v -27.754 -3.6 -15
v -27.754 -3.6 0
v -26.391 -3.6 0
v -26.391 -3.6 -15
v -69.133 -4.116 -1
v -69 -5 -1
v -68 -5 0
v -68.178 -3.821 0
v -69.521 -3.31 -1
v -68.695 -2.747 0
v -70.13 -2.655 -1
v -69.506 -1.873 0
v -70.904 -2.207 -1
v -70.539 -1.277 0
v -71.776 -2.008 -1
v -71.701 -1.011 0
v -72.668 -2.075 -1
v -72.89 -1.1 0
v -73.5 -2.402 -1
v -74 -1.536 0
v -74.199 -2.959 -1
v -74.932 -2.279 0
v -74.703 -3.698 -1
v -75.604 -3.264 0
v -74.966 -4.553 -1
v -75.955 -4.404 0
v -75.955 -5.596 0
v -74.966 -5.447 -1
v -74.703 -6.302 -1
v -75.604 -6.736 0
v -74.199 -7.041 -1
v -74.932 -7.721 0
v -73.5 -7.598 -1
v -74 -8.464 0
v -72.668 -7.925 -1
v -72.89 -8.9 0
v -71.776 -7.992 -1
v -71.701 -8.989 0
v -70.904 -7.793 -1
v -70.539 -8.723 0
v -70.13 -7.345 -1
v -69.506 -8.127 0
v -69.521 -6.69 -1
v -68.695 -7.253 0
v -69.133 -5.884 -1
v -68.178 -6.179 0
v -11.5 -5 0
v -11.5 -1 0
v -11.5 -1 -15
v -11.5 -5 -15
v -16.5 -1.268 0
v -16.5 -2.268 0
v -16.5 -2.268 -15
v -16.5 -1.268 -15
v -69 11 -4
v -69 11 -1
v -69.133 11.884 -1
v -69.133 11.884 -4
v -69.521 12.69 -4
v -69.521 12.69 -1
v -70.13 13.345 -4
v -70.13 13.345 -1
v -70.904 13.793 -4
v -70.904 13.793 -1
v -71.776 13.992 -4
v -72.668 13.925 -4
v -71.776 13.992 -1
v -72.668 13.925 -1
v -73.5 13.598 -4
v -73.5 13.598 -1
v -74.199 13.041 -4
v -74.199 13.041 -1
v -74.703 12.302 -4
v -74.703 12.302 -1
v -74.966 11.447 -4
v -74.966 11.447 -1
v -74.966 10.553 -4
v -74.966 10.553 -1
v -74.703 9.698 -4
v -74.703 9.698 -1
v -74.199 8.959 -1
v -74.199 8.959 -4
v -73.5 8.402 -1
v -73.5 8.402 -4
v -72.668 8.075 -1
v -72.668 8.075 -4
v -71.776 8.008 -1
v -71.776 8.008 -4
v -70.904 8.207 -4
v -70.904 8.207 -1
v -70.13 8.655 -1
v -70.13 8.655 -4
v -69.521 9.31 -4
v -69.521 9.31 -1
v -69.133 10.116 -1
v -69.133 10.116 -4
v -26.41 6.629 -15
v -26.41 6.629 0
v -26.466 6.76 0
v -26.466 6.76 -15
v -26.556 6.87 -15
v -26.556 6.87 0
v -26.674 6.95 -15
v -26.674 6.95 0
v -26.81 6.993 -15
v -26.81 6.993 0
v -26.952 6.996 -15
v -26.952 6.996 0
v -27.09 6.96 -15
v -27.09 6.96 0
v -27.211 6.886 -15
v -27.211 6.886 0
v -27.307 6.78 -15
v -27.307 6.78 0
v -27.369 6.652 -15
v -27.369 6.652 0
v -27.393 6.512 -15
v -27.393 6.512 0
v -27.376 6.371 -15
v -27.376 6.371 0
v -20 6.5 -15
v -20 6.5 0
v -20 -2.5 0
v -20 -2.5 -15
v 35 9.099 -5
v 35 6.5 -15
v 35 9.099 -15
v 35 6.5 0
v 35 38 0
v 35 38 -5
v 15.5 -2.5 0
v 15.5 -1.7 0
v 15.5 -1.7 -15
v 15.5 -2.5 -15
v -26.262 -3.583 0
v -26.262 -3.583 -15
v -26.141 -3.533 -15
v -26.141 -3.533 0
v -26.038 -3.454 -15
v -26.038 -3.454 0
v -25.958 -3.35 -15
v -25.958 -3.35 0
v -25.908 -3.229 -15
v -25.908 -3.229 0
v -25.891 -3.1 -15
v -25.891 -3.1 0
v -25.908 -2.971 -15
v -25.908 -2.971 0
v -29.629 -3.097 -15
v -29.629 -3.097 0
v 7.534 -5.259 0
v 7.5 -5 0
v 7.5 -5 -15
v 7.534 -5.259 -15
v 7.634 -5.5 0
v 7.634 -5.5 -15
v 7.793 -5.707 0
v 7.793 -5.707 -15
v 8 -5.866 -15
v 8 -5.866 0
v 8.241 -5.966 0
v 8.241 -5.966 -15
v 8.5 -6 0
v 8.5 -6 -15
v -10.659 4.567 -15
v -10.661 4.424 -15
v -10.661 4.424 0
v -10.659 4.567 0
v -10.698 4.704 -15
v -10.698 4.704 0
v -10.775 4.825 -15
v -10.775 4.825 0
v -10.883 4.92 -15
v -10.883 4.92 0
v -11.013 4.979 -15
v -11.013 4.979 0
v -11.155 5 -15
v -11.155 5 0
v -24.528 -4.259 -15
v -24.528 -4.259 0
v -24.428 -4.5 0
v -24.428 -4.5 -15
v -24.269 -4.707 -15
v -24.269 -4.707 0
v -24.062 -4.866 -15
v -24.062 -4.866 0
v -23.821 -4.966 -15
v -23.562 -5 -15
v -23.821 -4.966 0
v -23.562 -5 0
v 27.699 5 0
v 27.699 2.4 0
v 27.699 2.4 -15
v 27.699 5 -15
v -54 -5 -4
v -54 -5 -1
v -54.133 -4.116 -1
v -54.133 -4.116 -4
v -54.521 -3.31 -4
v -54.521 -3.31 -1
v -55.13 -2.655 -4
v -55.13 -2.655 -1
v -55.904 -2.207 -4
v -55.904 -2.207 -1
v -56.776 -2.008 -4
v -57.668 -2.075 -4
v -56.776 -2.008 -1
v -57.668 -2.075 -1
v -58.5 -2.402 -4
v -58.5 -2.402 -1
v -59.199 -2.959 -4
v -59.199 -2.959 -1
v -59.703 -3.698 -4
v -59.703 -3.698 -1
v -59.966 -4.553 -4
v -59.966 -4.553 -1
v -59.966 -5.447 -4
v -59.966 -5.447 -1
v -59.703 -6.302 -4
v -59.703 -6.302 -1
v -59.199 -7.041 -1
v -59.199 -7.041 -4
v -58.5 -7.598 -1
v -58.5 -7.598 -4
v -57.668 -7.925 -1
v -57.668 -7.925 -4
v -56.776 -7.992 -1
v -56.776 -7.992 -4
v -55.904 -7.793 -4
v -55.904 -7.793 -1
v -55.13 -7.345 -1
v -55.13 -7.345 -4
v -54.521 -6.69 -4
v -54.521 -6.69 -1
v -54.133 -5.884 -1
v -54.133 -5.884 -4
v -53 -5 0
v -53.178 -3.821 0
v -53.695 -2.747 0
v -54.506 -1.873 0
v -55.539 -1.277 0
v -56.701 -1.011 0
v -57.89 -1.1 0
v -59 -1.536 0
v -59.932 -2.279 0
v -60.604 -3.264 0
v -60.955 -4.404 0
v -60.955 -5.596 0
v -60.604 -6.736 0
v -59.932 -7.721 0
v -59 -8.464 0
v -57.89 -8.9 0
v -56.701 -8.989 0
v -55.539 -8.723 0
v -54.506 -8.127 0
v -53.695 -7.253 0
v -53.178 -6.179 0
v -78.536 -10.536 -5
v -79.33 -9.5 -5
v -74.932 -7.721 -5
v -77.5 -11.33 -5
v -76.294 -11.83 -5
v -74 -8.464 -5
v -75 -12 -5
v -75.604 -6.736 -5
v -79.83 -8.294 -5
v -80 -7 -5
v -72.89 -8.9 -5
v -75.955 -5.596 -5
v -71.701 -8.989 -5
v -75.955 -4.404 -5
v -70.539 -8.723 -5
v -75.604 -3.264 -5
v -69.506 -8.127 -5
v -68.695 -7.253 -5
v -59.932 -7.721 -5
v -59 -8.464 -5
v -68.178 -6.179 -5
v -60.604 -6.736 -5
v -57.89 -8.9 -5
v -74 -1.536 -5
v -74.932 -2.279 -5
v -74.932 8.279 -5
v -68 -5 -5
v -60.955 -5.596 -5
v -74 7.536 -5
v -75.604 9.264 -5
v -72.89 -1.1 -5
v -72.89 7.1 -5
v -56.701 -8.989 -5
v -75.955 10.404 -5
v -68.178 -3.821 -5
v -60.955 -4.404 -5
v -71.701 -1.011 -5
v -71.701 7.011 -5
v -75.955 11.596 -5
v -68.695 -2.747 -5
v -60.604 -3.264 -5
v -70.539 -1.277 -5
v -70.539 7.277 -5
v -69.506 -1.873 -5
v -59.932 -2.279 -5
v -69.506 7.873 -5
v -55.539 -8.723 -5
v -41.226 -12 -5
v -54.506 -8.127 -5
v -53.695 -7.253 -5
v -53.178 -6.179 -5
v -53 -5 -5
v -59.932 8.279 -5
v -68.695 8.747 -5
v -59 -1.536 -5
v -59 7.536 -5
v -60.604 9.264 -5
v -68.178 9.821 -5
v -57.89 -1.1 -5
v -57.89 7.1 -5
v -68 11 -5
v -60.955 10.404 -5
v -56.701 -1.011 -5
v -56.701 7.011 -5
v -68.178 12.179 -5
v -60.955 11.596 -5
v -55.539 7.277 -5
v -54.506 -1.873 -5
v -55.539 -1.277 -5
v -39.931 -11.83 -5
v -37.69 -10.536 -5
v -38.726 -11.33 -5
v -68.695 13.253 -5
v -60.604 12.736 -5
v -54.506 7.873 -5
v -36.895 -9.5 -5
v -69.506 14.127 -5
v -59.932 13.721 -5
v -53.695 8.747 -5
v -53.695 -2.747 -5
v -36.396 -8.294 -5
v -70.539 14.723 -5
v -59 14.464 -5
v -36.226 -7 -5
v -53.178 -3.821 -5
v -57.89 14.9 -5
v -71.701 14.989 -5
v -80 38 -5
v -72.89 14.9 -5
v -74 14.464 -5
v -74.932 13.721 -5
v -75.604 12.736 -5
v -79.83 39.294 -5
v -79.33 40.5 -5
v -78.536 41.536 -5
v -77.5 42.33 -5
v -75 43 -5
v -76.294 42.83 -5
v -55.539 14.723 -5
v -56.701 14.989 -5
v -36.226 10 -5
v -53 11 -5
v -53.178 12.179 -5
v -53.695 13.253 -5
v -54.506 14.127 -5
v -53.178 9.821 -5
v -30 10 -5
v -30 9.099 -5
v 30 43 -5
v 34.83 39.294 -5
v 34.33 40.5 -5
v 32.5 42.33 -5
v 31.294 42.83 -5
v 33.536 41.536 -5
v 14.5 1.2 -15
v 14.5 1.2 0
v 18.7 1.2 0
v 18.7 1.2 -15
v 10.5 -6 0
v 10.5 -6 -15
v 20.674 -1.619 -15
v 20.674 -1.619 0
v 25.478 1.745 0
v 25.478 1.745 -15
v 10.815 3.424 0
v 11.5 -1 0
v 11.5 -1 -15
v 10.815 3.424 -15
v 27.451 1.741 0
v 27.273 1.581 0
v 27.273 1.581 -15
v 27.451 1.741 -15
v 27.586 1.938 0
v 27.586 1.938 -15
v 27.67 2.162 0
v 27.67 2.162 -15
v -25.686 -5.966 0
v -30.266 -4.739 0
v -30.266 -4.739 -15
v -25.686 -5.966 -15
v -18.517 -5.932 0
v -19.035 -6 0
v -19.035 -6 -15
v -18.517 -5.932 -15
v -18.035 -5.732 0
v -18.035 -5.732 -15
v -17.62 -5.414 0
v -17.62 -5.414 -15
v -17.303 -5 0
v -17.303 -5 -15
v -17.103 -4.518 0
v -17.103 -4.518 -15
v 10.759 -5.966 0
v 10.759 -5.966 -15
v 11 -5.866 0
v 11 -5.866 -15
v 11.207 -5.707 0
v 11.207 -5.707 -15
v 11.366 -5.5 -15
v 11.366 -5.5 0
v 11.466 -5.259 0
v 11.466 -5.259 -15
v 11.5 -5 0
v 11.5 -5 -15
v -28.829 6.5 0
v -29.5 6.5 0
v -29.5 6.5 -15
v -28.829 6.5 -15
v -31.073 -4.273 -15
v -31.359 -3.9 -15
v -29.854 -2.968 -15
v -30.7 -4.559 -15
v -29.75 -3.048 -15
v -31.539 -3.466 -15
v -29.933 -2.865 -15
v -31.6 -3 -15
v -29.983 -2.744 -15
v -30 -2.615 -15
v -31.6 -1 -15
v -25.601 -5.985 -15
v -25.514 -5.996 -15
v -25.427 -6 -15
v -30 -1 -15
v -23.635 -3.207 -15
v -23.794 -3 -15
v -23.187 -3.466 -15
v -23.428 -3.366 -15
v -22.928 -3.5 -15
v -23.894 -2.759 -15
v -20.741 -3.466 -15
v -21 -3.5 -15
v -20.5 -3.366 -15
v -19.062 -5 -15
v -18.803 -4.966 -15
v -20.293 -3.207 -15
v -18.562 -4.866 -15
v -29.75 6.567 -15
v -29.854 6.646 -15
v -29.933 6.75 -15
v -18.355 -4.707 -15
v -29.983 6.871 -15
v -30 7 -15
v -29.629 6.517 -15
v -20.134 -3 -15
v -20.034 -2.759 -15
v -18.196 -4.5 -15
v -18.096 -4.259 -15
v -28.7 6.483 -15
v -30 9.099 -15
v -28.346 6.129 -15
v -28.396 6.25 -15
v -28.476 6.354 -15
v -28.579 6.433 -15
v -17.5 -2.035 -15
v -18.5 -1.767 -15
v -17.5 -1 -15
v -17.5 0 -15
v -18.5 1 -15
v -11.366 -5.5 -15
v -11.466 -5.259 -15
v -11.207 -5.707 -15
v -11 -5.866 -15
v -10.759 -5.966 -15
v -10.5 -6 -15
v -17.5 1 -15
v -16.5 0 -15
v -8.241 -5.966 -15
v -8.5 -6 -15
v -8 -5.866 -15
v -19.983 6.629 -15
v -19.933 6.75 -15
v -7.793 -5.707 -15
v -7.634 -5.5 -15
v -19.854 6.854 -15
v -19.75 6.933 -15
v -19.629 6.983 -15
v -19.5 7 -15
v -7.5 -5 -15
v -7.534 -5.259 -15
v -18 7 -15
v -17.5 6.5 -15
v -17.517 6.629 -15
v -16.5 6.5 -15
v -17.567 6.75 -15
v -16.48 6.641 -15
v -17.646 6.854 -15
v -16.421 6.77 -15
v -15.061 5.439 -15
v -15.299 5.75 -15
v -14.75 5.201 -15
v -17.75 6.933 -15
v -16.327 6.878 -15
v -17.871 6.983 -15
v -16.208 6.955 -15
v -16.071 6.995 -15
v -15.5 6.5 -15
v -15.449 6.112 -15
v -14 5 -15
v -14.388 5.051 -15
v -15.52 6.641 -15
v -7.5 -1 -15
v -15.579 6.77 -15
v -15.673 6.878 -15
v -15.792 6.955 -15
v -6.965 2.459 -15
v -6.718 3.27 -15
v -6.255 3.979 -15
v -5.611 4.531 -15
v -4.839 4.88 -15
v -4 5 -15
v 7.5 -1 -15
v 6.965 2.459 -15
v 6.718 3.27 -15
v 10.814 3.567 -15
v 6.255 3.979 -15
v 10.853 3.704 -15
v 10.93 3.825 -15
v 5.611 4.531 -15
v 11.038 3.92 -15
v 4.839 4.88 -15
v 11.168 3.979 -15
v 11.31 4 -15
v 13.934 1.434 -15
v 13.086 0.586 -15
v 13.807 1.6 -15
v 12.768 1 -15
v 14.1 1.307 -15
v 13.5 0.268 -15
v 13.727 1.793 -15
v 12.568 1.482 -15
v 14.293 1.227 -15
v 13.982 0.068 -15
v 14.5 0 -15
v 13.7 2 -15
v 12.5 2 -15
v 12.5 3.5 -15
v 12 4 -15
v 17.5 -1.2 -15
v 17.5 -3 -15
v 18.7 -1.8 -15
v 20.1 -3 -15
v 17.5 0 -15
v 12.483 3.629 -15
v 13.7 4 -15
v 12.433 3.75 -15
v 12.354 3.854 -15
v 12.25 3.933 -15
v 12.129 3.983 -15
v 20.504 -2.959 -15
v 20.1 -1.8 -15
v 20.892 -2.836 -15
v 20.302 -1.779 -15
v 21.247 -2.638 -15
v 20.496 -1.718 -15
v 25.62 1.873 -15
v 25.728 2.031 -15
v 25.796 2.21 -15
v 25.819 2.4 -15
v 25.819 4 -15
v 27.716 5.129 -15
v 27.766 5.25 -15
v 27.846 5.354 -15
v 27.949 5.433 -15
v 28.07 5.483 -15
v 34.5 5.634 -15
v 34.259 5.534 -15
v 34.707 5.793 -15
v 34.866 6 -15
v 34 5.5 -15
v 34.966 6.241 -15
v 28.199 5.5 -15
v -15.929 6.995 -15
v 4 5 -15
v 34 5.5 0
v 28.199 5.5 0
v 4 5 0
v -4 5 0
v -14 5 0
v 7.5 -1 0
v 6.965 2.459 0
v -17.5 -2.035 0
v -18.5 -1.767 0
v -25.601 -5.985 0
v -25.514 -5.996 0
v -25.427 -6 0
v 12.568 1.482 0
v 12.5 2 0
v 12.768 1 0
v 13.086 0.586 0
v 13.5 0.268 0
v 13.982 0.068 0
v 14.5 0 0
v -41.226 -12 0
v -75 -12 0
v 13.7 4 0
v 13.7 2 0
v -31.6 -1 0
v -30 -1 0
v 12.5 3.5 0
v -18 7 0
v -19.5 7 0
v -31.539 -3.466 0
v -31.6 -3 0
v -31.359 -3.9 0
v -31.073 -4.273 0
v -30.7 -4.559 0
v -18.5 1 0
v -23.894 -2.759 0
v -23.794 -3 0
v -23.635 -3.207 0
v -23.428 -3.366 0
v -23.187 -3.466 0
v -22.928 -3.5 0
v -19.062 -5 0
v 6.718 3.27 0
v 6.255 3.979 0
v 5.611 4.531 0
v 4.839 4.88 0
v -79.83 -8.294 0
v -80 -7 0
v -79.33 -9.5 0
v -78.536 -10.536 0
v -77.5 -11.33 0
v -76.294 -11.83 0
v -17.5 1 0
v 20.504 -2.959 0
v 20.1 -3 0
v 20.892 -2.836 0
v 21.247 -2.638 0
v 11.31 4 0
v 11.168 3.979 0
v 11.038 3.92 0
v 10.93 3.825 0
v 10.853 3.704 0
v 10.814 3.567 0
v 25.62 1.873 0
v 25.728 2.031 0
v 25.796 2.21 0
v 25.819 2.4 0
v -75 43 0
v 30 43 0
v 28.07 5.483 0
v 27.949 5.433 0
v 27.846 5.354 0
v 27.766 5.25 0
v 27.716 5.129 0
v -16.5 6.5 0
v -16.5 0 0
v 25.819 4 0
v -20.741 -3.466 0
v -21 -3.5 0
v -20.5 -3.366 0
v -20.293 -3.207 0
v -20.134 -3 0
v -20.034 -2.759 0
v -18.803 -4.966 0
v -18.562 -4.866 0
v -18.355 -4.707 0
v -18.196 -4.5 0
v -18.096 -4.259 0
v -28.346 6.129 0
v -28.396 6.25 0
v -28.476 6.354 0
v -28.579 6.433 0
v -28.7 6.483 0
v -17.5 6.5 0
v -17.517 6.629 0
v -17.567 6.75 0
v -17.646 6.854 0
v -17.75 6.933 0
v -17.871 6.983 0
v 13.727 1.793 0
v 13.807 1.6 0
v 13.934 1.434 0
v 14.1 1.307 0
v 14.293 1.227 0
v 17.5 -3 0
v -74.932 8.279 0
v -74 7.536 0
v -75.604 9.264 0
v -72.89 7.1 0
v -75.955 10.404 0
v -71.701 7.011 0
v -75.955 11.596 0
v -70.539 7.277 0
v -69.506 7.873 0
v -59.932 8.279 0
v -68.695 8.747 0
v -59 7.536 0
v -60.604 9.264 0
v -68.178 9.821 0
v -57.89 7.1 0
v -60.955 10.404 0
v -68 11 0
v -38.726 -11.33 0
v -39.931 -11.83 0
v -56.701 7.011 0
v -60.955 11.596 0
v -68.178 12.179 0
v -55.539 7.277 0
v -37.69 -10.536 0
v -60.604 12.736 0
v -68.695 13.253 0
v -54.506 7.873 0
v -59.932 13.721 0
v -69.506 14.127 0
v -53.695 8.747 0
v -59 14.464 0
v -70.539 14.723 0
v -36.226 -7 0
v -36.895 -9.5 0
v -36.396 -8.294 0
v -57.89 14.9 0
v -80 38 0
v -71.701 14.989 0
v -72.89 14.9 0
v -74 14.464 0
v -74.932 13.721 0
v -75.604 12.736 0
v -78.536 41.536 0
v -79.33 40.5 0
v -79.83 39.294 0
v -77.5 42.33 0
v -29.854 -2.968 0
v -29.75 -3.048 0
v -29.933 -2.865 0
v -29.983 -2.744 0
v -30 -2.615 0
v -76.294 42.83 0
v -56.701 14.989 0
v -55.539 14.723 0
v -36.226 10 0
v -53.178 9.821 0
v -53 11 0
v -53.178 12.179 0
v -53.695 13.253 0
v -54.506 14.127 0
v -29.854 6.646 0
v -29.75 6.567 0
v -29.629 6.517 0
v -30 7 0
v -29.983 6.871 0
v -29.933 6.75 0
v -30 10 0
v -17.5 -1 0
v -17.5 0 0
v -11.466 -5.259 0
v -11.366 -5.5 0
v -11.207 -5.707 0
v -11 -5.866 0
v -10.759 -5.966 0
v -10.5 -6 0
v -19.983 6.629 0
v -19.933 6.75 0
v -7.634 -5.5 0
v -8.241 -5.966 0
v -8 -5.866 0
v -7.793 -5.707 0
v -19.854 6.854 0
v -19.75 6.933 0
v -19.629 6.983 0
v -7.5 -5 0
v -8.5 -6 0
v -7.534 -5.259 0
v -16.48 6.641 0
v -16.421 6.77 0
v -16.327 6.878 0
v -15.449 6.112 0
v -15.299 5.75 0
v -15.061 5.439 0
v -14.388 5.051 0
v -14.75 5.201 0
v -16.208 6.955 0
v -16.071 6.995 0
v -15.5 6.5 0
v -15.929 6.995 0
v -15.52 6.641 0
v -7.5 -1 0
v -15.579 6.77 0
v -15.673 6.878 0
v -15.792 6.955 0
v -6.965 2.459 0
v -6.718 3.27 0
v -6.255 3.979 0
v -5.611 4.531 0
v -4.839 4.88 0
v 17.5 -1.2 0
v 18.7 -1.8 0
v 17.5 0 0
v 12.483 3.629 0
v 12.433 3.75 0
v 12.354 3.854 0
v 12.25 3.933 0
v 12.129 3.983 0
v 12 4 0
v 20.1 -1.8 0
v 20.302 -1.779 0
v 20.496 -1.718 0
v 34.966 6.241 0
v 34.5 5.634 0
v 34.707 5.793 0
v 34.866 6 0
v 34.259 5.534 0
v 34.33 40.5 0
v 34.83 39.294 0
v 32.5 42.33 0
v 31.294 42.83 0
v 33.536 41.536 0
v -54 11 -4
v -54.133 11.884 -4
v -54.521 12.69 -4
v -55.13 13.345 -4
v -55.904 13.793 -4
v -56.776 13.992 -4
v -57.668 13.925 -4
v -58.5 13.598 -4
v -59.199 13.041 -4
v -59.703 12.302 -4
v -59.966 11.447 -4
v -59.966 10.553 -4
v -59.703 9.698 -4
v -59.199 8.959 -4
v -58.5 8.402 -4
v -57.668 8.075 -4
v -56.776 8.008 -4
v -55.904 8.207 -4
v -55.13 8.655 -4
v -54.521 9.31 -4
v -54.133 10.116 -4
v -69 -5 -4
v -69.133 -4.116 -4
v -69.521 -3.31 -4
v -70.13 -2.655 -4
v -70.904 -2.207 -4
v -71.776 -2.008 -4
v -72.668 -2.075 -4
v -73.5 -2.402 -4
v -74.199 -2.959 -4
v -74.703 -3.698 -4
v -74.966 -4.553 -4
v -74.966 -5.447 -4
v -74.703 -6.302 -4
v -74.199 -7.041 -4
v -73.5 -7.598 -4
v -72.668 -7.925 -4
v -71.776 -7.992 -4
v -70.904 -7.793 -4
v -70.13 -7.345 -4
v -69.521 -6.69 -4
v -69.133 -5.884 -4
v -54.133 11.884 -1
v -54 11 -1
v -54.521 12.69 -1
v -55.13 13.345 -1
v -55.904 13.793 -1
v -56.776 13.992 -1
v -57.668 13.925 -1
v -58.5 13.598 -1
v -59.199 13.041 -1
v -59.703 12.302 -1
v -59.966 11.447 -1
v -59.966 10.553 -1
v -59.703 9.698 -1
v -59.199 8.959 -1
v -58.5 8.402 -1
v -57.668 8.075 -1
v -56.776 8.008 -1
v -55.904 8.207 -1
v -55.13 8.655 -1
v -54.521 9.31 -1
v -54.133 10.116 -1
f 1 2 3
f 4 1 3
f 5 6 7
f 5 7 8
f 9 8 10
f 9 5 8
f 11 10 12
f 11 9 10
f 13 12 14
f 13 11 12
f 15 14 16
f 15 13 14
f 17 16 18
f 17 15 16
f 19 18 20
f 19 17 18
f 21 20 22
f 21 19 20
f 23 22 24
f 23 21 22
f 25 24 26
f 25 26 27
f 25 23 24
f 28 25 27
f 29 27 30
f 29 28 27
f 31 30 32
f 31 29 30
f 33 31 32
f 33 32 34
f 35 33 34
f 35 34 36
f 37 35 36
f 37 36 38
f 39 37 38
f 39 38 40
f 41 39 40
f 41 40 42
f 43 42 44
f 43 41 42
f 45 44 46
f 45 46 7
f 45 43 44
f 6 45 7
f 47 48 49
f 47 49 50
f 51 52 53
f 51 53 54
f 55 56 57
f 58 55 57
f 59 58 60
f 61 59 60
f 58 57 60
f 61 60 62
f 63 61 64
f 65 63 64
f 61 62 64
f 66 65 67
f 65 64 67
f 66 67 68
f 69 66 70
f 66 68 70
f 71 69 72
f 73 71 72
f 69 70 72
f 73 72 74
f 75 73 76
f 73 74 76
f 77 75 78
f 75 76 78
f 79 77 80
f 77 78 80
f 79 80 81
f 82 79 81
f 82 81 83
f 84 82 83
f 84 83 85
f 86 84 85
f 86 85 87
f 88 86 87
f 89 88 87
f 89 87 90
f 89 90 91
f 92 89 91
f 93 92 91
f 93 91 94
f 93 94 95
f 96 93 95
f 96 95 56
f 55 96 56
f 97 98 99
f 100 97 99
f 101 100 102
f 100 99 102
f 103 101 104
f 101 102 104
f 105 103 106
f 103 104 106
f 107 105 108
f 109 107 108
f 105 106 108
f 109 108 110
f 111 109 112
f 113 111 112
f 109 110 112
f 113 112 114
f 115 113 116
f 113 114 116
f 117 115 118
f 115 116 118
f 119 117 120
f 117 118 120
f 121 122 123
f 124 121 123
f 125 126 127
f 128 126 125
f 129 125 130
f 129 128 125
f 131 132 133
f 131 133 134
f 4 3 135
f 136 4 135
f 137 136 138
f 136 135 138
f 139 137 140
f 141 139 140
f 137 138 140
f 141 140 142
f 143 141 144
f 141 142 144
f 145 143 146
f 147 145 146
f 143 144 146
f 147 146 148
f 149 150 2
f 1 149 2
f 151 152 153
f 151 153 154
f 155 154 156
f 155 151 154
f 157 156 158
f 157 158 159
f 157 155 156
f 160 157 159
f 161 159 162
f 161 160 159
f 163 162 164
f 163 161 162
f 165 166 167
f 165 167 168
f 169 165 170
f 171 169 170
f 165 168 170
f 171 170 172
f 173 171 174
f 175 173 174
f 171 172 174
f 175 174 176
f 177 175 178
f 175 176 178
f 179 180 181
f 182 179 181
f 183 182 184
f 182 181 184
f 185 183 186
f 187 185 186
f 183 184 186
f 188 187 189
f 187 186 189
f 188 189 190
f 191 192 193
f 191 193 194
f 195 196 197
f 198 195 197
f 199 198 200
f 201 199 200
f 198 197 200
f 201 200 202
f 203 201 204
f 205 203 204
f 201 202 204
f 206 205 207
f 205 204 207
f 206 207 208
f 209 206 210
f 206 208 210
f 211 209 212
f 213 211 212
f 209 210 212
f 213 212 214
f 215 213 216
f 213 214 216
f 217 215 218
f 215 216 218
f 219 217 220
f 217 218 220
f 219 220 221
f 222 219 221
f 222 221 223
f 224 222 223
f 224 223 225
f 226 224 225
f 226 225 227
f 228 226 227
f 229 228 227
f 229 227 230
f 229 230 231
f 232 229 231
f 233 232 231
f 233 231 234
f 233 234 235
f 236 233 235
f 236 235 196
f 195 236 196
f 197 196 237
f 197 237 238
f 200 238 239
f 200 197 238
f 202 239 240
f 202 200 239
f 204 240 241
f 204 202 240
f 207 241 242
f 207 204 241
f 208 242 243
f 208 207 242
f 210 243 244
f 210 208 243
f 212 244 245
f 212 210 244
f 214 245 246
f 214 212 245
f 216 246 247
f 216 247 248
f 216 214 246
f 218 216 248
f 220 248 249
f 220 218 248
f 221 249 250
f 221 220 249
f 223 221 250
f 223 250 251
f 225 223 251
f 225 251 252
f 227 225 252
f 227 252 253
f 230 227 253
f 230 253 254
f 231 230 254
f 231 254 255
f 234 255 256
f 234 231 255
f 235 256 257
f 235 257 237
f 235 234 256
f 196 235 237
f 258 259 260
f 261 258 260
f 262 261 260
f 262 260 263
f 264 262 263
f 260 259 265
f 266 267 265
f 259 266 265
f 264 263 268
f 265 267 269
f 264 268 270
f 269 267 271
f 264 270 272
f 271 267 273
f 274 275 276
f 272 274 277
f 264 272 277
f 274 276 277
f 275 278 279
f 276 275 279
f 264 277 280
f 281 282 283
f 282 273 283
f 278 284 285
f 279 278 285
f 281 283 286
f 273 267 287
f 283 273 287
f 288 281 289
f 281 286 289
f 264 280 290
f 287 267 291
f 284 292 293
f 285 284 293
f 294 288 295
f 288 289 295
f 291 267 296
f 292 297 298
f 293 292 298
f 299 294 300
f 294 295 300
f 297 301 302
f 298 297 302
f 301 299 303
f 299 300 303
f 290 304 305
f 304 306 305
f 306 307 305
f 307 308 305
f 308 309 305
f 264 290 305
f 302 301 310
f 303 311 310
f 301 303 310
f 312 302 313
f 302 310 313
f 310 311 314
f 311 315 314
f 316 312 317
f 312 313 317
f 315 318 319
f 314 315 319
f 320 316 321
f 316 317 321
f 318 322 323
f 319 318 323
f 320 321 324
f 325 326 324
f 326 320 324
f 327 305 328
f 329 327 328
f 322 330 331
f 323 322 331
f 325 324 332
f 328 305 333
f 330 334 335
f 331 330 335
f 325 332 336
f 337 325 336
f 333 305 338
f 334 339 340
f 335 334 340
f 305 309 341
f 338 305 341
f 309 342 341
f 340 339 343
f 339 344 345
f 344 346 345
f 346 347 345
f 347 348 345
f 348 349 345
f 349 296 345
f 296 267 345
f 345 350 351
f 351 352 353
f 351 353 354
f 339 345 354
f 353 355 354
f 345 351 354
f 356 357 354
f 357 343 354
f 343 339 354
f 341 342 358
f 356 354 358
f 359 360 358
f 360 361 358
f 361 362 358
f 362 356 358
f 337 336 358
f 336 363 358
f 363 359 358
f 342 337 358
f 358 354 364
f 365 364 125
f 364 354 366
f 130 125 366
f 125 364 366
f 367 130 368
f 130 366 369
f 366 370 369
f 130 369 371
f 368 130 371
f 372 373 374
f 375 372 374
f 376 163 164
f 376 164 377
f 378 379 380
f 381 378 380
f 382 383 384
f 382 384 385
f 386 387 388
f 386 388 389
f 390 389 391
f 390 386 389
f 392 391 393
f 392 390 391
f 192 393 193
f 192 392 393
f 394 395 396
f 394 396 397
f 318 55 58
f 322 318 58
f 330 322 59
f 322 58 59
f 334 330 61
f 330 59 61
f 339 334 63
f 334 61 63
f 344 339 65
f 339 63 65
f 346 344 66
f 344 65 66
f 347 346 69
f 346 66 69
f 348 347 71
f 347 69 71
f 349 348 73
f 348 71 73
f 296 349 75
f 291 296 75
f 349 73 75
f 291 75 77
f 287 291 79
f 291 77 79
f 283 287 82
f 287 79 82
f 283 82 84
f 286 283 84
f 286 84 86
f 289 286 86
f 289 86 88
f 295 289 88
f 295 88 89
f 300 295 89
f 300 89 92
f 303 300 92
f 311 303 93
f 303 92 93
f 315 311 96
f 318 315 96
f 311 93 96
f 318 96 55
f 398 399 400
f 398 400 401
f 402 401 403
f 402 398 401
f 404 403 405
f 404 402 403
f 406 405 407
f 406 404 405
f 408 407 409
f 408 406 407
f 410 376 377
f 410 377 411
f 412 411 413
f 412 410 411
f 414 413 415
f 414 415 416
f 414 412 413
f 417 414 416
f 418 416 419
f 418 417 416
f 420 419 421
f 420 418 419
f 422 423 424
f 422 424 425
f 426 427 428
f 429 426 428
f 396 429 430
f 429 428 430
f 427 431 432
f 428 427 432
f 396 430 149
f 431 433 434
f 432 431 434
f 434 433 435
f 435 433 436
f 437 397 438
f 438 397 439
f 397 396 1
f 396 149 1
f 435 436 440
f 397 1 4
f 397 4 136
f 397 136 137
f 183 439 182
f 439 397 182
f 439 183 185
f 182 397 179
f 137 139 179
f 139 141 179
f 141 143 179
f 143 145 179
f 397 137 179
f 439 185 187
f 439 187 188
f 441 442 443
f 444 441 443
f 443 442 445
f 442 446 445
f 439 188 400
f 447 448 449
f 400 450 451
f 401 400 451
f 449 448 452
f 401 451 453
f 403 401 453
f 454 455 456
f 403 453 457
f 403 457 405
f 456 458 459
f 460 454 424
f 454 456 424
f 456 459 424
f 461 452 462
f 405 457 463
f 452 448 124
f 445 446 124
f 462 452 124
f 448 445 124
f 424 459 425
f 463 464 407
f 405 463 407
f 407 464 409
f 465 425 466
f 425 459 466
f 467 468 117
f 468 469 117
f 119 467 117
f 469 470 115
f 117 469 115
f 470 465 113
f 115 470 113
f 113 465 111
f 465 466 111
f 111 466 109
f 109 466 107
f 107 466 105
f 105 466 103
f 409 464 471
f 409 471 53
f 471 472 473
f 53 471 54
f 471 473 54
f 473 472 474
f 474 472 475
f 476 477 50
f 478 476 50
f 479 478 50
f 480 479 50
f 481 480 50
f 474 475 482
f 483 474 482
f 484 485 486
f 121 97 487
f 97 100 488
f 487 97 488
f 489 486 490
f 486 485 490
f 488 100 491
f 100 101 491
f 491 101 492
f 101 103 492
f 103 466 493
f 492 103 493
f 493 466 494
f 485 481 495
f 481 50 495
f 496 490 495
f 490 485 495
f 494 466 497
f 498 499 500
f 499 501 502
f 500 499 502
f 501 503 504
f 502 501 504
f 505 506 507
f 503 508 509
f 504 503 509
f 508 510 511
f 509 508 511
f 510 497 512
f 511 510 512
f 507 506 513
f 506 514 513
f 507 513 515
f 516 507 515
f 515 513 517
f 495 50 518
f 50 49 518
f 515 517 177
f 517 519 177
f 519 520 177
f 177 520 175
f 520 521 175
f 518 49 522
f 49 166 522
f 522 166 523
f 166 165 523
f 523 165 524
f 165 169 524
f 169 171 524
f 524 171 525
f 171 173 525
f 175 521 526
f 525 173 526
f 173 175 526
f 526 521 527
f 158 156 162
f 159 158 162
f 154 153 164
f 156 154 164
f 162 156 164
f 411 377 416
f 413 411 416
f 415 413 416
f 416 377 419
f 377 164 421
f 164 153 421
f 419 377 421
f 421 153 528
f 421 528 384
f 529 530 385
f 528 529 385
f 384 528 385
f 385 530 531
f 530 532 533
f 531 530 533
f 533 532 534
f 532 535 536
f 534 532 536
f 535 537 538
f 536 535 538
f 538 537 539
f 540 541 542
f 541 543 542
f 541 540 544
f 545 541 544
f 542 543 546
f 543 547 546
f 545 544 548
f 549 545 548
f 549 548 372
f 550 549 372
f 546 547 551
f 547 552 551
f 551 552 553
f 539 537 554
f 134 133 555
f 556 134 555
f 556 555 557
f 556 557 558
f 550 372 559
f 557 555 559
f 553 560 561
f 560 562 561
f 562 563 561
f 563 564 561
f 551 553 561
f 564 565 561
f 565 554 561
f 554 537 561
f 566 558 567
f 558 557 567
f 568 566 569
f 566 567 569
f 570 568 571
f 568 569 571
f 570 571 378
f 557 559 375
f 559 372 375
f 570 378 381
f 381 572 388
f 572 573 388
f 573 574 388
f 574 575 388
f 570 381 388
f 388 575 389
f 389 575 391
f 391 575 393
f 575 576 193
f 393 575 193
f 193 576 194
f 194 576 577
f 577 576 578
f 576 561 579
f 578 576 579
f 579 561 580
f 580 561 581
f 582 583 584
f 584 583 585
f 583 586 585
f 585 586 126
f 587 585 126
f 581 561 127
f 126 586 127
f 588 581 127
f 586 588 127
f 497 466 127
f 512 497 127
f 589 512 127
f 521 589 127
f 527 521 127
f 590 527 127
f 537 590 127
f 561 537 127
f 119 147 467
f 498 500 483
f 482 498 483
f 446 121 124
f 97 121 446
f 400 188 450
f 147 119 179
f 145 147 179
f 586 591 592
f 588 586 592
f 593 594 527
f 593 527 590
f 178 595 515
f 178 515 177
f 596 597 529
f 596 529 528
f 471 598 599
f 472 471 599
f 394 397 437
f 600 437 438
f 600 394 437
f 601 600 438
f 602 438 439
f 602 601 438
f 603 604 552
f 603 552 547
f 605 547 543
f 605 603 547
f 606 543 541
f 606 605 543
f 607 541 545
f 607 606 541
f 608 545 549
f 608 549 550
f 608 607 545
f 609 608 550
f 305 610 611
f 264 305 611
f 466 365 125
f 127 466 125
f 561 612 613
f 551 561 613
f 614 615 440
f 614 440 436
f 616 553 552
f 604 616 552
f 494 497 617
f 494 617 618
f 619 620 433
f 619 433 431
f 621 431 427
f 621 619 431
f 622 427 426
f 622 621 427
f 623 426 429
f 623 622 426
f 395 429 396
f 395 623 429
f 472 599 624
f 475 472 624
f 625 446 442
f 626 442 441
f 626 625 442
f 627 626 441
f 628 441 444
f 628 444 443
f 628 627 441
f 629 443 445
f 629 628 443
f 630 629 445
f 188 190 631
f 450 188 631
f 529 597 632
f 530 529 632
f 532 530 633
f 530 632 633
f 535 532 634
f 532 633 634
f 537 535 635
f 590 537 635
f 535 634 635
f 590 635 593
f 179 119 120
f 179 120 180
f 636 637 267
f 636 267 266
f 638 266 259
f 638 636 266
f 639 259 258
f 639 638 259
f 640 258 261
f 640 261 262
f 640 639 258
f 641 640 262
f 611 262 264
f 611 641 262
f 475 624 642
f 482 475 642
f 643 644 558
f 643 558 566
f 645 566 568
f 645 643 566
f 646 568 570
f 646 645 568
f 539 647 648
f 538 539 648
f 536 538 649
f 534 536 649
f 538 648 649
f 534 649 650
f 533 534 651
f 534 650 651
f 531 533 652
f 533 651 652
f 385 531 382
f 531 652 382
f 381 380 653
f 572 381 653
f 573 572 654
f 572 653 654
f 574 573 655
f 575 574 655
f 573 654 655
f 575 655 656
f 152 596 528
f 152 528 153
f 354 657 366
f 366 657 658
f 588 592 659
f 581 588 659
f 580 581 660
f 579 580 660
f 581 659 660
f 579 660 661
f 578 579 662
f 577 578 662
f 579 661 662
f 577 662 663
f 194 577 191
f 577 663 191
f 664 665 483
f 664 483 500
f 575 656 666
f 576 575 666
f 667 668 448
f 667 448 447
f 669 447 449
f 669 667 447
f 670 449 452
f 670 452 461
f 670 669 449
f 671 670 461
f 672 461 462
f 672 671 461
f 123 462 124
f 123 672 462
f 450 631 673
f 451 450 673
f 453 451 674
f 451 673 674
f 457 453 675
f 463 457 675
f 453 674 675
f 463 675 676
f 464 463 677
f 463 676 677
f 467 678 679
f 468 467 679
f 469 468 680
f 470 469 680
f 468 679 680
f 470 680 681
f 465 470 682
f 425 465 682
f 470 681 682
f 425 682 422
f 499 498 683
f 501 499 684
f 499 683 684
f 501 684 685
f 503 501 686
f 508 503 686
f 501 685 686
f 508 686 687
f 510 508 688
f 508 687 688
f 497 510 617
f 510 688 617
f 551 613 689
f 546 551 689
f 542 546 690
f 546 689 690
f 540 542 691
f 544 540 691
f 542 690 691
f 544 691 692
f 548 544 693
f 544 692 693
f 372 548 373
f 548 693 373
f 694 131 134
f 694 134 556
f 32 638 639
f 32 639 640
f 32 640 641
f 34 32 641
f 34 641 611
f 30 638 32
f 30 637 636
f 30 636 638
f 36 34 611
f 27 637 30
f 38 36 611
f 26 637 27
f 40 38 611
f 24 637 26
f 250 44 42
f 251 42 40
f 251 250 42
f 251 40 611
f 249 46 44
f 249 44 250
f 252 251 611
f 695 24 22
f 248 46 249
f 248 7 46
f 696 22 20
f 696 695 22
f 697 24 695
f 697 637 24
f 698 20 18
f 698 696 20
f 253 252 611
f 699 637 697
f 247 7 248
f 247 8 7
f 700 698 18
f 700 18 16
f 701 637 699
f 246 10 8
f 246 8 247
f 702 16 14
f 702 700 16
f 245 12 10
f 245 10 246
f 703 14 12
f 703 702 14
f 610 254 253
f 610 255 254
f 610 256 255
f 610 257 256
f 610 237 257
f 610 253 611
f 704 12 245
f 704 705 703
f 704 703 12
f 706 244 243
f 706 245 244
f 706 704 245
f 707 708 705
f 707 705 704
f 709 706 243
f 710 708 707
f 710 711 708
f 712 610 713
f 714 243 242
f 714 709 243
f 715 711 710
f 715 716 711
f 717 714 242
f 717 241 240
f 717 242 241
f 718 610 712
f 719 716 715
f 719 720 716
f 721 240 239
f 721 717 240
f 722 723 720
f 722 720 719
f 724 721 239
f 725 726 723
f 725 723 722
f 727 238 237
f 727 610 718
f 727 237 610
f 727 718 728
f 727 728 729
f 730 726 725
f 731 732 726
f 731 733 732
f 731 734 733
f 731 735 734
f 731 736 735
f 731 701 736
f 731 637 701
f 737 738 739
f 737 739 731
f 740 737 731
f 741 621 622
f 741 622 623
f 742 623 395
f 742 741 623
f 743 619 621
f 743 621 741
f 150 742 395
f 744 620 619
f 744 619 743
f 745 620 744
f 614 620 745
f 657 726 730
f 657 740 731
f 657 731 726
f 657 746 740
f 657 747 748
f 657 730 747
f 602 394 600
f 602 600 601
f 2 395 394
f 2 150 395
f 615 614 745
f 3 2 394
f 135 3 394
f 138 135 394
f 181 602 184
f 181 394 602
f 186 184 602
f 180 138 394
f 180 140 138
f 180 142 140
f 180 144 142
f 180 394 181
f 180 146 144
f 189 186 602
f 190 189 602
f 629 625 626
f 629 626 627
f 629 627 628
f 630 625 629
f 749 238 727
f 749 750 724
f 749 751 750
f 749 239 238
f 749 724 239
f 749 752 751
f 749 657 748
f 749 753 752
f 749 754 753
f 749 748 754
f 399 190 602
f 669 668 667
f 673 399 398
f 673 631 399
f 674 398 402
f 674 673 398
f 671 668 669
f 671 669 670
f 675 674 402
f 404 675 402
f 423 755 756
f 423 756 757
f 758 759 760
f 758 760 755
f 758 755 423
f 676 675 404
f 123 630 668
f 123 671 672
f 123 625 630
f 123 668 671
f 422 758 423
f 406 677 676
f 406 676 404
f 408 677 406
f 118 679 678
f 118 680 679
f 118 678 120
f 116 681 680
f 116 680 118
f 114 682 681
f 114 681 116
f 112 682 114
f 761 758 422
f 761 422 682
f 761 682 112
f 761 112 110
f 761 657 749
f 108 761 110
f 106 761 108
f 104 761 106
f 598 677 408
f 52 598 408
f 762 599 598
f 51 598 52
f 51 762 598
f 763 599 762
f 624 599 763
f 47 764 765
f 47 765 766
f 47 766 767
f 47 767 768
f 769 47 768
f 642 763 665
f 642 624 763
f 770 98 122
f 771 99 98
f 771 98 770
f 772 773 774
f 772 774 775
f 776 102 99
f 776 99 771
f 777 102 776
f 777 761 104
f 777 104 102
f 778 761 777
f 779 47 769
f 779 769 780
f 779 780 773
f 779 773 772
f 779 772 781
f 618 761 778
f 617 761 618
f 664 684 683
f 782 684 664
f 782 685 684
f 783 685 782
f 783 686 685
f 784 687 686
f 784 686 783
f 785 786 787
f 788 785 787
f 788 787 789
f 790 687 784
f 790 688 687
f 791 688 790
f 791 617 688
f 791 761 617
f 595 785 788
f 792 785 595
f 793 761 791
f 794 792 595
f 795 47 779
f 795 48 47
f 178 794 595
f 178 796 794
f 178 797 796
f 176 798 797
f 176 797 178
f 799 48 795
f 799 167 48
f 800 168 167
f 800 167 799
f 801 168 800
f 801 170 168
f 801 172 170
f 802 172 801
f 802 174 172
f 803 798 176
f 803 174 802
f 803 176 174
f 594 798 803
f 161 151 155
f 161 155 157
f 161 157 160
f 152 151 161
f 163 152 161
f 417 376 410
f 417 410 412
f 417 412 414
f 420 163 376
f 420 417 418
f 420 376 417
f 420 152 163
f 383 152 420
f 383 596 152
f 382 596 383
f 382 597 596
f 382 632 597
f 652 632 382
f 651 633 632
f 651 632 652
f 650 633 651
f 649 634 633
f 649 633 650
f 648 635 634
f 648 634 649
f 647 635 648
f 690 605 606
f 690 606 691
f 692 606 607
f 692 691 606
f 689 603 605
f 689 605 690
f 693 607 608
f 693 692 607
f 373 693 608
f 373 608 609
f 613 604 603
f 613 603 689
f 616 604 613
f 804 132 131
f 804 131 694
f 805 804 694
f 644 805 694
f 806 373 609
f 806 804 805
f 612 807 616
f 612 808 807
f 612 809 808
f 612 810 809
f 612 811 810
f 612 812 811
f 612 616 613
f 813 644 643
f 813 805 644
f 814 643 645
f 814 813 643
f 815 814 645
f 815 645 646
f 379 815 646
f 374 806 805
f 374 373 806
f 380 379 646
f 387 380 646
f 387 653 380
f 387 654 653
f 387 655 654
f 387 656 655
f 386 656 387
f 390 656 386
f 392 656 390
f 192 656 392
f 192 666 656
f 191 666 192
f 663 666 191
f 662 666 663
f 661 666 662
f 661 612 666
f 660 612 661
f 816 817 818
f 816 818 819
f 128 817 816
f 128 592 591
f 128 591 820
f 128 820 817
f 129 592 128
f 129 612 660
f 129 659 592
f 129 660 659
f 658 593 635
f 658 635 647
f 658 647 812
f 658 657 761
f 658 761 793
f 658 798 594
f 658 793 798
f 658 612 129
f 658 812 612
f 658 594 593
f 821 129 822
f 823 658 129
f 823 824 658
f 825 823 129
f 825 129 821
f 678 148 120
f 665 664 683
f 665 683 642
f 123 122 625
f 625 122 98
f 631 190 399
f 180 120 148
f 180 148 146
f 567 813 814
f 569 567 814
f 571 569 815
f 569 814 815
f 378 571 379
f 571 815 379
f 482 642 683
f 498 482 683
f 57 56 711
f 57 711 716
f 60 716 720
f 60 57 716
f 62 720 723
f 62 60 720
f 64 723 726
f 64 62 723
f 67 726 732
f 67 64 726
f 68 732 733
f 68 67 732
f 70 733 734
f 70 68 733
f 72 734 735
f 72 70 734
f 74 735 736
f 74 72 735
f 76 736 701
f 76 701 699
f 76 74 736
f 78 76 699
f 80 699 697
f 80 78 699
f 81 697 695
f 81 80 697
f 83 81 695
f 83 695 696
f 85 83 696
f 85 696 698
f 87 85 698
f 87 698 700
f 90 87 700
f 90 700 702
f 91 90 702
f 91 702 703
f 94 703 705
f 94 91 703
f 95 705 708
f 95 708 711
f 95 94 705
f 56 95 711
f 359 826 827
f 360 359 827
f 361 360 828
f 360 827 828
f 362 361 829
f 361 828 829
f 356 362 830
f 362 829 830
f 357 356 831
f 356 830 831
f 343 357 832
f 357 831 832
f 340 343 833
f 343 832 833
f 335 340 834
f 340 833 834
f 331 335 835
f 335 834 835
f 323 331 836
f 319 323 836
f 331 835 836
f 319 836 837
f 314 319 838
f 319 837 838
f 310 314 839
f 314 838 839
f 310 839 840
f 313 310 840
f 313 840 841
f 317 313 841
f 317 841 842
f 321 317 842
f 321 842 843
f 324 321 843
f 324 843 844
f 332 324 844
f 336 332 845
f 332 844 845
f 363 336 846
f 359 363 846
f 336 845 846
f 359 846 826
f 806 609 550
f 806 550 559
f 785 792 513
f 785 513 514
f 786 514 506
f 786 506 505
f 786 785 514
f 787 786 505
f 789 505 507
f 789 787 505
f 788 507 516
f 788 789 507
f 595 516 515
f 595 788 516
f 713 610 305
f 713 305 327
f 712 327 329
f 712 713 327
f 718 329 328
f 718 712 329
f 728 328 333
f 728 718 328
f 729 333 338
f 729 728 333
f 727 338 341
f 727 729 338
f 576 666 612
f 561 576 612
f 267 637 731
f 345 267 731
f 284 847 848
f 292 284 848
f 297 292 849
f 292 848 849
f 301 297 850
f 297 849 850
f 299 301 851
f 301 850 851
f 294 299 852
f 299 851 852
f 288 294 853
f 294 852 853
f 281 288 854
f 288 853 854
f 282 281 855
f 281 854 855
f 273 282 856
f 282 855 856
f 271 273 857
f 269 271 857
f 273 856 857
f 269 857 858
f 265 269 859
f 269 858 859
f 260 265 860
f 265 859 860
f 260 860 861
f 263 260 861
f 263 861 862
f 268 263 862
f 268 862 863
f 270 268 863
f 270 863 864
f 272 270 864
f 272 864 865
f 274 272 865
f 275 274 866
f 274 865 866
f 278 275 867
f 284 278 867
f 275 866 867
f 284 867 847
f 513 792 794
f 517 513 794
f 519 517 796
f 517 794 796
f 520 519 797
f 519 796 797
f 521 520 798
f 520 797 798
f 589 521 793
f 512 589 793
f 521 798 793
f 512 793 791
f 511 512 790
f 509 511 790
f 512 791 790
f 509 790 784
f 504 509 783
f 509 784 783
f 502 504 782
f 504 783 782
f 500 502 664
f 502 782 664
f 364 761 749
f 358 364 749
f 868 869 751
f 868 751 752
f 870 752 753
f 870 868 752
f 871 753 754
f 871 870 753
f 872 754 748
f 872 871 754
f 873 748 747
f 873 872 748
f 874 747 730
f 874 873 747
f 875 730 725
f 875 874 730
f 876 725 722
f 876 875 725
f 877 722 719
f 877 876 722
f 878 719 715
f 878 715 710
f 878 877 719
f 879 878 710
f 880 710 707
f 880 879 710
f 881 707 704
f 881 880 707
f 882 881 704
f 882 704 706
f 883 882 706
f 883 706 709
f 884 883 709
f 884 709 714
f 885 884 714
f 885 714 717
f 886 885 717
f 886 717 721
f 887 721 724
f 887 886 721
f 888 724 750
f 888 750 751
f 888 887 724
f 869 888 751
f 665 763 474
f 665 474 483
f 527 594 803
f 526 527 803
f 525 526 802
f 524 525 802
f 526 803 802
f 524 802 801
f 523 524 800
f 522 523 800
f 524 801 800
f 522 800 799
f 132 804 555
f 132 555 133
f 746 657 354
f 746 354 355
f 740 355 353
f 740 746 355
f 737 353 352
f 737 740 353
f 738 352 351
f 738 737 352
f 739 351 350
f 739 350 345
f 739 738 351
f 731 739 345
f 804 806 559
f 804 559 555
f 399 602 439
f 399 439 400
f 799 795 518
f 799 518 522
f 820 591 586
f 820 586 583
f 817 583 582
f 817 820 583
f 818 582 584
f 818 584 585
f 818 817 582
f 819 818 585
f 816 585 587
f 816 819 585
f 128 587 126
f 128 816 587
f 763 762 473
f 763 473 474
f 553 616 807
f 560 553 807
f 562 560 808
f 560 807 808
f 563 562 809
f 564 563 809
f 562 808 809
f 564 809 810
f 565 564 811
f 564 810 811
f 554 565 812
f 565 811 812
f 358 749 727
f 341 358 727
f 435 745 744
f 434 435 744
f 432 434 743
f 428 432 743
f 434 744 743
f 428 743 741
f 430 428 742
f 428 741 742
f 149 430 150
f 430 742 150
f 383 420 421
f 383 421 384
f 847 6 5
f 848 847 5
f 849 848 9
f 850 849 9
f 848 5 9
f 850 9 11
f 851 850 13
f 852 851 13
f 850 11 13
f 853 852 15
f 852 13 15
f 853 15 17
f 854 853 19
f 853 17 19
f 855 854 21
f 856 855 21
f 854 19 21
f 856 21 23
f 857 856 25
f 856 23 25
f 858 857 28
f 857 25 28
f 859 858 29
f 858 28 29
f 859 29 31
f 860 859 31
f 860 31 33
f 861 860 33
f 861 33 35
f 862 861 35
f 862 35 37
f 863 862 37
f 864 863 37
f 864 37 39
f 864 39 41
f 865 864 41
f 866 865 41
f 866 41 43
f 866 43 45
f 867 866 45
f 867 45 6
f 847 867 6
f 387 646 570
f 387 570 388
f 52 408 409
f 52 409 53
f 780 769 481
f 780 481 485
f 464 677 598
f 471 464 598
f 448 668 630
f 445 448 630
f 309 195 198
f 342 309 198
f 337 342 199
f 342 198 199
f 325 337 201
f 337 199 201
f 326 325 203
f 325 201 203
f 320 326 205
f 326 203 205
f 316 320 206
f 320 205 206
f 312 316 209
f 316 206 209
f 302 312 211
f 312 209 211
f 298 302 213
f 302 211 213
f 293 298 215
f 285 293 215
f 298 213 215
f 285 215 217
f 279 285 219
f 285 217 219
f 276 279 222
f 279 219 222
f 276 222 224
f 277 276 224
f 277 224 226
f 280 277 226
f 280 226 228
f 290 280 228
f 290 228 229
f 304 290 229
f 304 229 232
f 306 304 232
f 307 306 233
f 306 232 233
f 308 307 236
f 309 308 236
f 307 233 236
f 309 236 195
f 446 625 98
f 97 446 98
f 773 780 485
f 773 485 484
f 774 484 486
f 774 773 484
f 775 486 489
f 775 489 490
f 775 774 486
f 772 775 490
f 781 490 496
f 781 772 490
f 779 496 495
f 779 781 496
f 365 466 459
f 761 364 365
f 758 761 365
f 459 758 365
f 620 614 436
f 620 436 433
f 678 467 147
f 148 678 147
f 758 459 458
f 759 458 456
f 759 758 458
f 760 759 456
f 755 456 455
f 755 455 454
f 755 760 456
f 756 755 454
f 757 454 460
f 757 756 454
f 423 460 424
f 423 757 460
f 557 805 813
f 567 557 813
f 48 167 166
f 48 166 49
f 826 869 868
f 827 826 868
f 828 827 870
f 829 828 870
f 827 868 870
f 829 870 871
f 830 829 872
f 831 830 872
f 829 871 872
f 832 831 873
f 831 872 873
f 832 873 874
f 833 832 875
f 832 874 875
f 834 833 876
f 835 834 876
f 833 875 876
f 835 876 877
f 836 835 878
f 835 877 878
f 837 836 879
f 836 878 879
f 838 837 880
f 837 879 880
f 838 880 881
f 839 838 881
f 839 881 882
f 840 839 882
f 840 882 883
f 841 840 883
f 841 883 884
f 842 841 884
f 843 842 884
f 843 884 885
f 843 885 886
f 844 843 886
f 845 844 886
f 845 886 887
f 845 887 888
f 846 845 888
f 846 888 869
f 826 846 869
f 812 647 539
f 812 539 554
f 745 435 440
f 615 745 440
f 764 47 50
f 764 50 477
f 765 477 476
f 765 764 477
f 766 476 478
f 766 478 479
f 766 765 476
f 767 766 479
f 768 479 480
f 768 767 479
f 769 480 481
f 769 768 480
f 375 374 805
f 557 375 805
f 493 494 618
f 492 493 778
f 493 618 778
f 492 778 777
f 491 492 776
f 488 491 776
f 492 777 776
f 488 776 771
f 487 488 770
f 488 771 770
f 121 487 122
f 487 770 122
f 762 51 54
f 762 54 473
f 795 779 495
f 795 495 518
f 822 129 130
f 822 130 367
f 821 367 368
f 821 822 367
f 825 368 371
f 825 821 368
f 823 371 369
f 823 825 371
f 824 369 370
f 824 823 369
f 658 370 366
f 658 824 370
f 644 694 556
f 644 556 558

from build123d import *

# Parameters (mm, degrees)
SKETCH_R     = 3
PAD_DEPTH    = 15
POCKET_DEPTH = 10.001
CHAMFER_SIZE = 1


with BuildPart() as part:
    # Sketch → Pad (new body)
    with BuildSketch(Plane.XY):
        with BuildLine():
            Line((-30, 10), (-30, 7))
            ThreePointArc((-30, 7), (-29.853553, 6.646447), (-29.5, 6.5))
            Line((-29.5, 6.5), (-28.829405, 6.5))
            ThreePointArc((-28.346442, 6.12941), (-28.525024, 6.396677), (-28.829405, 6.5))
            Line((-28.346442, 6.12941), (-25.908104, -2.97059))
            ThreePointArc((-26.391067, -3.6), (-25.99439, -3.404381), (-25.908104, -2.97059))
            Line((-27.753955, -3.6), (-26.391067, -3.6))
            Line((-29.62941, -3.097473), (-27.753955, -3.6))
            ThreePointArc((-30, -2.61451), (-29.896677, -2.918891), (-29.62941, -3.097473))
            Line((-30, -2.61451), (-30, -1))
            Line((-30, -1), (-31.6, -1))
            Line((-31.6, -1), (-31.6, -3))
            ThreePointArc((-31.6, -3), (-31.228036, -4.095771), (-30.265874, -4.738666))
            Line((-30.265874, -4.738666), (-25.68568, -5.965926))
            ThreePointArc((-25.68568, -5.965926), (-25.557387, -5.991445), (-25.426861, -6))
            Line((-25.426861, -6), (-19.034654, -6))
            ThreePointArc((-19.034654, -6), (-17.817131, -5.586707), (-17.102802, -4.517638))
            Line((-17.102802, -4.517638), (-16.5, -2.267949))
            Line((-16.5, -2.267949), (-16.5, -1.267949))
            Line((-16.5, -1.267949), (-17.5, -1))
            Line((-17.5, -1), (-17.5, 0))
            Line((-17.5, 0), (-16.5, 0))
            Line((-16.5, 0), (-16.5, 6.5))
            ThreePointArc((-15.5, 6.5), (-16, 7), (-16.5, 6.5))
            ThreePointArc((-15.5, 6.5), (-15.06066, 5.43934), (-14, 5))
            Line((-14, 5), (-11.154762, 5))
            ThreePointArc((-10.660644, 4.423529), (-10.775134, 4.825396), (-11.154762, 5))
            Line((-10.660644, 4.423529), (-11.5, -1))
            Line((-11.5, -1), (-11.5, -5))
            ThreePointArc((-11.5, -5), (-11.207107, -5.707107), (-10.5, -6))
            Line((-10.5, -6), (-8.5, -6))
            ThreePointArc((-8.5, -6), (-7.792893, -5.707107), (-7.5, -5))
            Line((-7.5, -5), (-7.5, -1))
            Line((-7.5, -1), (-6.964706, 2.458824))
            ThreePointArc((-4, 5), (-5.952374, 4.27777), (-6.964706, 2.458824))
            Line((-4, 5), (4, 5))
            ThreePointArc((6.964706, 2.458824), (5.952374, 4.27777), (4, 5))
            Line((6.964706, 2.458824), (7.5, -1))
            Line((7.5, -1), (7.5, -5))
            ThreePointArc((7.5, -5), (7.792893, -5.707107), (8.5, -6))
            Line((8.5, -6), (10.5, -6))
            ThreePointArc((10.5, -6), (11.207107, -5.707107), (11.5, -5))
            Line((11.5, -5), (11.5, -1))
            Line((11.5, -1), (10.815406, 3.423529))
            ThreePointArc((11.309524, 4), (10.929896, 3.825396), (10.815406, 3.423529))
            Line((11.309524, 4), (12, 4))
            ThreePointArc((12.5, 3.5), (12.353553, 3.853553), (12, 4))
            Line((12.5, 3.5), (12.5, 2))
            ThreePointArc((12.5, 2), (13.085786, 0.585786), (14.5, 0))
            Line((14.5, 0), (17.5, 0))
            Line((17.5, 0), (17.5, -1.2))
            Line((17.5, -1.2), (15.5, -1.7))
            Line((15.5, -1.7), (15.5, -2.5))
            Line((15.5, -2.5), (17.5, -3))
            Line((17.5, -3), (20.1, -3))
            ThreePointArc((20.1, -3), (20.701412, -2.907434), (21.247153, -2.638304))
            Line((21.247153, -2.638304), (27.272726, 1.580848))
            ThreePointArc((27.272726, 1.580848), (27.586161, 1.938251), (27.69915, 2.4))
            Line((27.69915, 2.4), (27.69915, 5))
            ThreePointArc((28.19915, 5.5), (27.845597, 5.353553), (27.69915, 5))
            Line((34, 5.5), (28.19915, 5.5))
            ThreePointArc((34, 5.5), (34.707107, 5.792893), (35, 6.5))
            Line((35, 6.5), (35, 38))
            ThreePointArc((35, 38), (33.535534, 41.535534), (30, 43))
            Line((-75, 43), (30, 43))
            ThreePointArc((-75, 43), (-78.535534, 41.535534), (-80, 38))
            Line((-80, -7), (-80, 38))
            ThreePointArc((-80, -7), (-78.535534, -10.535534), (-75, -12))
            Line((-41.225519, -12), (-75, -12))
            ThreePointArc((-41.225519, -12), (-37.689985, -10.535534), (-36.225519, -7))
            Line((-36.225519, 10), (-36.225519, -7))
            Line((-30, 10), (-36.225519, 10))
        make_face()
        with Locations((-72, -5)):
            Circle(SKETCH_R, mode=Mode.SUBTRACT)
        with Locations((-72, 11)):
            Circle(SKETCH_R, mode=Mode.SUBTRACT)
        with Locations((-57, 11)):
            Circle(SKETCH_R, mode=Mode.SUBTRACT)
        with Locations((-57, -5)):
            Circle(SKETCH_R, mode=Mode.SUBTRACT)
        with BuildLine():
            Line((-23.894296, -2.758819), (-26.409864, 6.62941))
            ThreePointArc((-26.409864, 6.62941), (-27.022236, 6.982963), (-27.37579, 6.37059))
            Line((-27.37579, 6.37059), (-24.527648, -4.258819))
            ThreePointArc((-24.527648, -4.258819), (-24.170484, -4.793353), (-23.561722, -5))
            Line((-23.561722, -5), (-19.061722, -5))
            ThreePointArc((-19.061722, -5), (-18.452961, -4.793353), (-18.095797, -4.258819))
            Line((-18.095797, -4.258819), (-17.5, -2.035276))
            Line((-17.5, -2.035276), (-18.5, -1.767327))
            Line((-18.5, -1.767327), (-18.5, 1))
            Line((-18.5, 1), (-17.5, 1))
            Line((-17.5, 1), (-17.5, 6.5))
            ThreePointArc((-17.5, 6.5), (-17.646447, 6.853553), (-18, 7))
            Line((-18, 7), (-19.5, 7))
            ThreePointArc((-19.5, 7), (-19.853553, 6.853553), (-20, 6.5))
            Line((-20, 6.5), (-20, -2.5))
            ThreePointArc((-21, -3.5), (-20.292893, -3.207107), (-20, -2.5))
            Line((-21, -3.5), (-22.92837, -3.5))
            ThreePointArc((-23.894296, -2.758819), (-23.537131, -3.293353), (-22.92837, -3.5))
        make_face(mode=Mode.SUBTRACT)
        with BuildLine():
            Line((25.818763, 4), (13.7, 4))
            Line((13.7, 4), (13.7, 2))
            ThreePointArc((13.7, 2), (13.934315, 1.434315), (14.5, 1.2))
            Line((14.5, 1.2), (18.7, 1.2))
            Line((18.7, 1.2), (18.7, -1.8))
            Line((18.7, -1.8), (20.1, -1.8))
            ThreePointArc((20.1, -1.8), (20.400706, -1.753717), (20.673576, -1.619152))
            Line((20.673576, -1.619152), (25.477624, 1.744678))
            ThreePointArc((25.477624, 1.744678), (25.728372, 2.030601), (25.818763, 2.4))
            Line((25.818763, 2.4), (25.818763, 4))
        make_face(mode=Mode.SUBTRACT)
    extrude(amount=-PAD_DEPTH)

    # Sketch001 → Pocket (cut, through all)
    with BuildSketch(Plane.XY.offset(-5)):
        Polygon((-87.346291, -13.915375), (-32.433765, -13.915375), (-32.433765, 9.099434), (44.147678, 9.099434), (44.147678, 52.70644), (-87.346291, 52.70644), align=None)
    extrude(amount=-POCKET_DEPTH, mode=Mode.SUBTRACT)

    # Chamfer
    chamfer_edges = [part.edges().sort_by_distance(p)[0] for p in [
        (-75, 11, 0),
        (-69, 11, -2.5),
        (-75, 11, -5),
        (-60, 11, 0),
        (-54, 11, -2.5),
        (-60, 11, -5),
        (-60, -5, 0),
        (-54, -5, -2.5),
        (-60, -5, -5),
        (-75, -5, 0),
        (-69, -5, -2.5),
        (-75, -5, -5),
    ]]
    chamfer(chamfer_edges, length=CHAMFER_SIZE)


solid = part.part
